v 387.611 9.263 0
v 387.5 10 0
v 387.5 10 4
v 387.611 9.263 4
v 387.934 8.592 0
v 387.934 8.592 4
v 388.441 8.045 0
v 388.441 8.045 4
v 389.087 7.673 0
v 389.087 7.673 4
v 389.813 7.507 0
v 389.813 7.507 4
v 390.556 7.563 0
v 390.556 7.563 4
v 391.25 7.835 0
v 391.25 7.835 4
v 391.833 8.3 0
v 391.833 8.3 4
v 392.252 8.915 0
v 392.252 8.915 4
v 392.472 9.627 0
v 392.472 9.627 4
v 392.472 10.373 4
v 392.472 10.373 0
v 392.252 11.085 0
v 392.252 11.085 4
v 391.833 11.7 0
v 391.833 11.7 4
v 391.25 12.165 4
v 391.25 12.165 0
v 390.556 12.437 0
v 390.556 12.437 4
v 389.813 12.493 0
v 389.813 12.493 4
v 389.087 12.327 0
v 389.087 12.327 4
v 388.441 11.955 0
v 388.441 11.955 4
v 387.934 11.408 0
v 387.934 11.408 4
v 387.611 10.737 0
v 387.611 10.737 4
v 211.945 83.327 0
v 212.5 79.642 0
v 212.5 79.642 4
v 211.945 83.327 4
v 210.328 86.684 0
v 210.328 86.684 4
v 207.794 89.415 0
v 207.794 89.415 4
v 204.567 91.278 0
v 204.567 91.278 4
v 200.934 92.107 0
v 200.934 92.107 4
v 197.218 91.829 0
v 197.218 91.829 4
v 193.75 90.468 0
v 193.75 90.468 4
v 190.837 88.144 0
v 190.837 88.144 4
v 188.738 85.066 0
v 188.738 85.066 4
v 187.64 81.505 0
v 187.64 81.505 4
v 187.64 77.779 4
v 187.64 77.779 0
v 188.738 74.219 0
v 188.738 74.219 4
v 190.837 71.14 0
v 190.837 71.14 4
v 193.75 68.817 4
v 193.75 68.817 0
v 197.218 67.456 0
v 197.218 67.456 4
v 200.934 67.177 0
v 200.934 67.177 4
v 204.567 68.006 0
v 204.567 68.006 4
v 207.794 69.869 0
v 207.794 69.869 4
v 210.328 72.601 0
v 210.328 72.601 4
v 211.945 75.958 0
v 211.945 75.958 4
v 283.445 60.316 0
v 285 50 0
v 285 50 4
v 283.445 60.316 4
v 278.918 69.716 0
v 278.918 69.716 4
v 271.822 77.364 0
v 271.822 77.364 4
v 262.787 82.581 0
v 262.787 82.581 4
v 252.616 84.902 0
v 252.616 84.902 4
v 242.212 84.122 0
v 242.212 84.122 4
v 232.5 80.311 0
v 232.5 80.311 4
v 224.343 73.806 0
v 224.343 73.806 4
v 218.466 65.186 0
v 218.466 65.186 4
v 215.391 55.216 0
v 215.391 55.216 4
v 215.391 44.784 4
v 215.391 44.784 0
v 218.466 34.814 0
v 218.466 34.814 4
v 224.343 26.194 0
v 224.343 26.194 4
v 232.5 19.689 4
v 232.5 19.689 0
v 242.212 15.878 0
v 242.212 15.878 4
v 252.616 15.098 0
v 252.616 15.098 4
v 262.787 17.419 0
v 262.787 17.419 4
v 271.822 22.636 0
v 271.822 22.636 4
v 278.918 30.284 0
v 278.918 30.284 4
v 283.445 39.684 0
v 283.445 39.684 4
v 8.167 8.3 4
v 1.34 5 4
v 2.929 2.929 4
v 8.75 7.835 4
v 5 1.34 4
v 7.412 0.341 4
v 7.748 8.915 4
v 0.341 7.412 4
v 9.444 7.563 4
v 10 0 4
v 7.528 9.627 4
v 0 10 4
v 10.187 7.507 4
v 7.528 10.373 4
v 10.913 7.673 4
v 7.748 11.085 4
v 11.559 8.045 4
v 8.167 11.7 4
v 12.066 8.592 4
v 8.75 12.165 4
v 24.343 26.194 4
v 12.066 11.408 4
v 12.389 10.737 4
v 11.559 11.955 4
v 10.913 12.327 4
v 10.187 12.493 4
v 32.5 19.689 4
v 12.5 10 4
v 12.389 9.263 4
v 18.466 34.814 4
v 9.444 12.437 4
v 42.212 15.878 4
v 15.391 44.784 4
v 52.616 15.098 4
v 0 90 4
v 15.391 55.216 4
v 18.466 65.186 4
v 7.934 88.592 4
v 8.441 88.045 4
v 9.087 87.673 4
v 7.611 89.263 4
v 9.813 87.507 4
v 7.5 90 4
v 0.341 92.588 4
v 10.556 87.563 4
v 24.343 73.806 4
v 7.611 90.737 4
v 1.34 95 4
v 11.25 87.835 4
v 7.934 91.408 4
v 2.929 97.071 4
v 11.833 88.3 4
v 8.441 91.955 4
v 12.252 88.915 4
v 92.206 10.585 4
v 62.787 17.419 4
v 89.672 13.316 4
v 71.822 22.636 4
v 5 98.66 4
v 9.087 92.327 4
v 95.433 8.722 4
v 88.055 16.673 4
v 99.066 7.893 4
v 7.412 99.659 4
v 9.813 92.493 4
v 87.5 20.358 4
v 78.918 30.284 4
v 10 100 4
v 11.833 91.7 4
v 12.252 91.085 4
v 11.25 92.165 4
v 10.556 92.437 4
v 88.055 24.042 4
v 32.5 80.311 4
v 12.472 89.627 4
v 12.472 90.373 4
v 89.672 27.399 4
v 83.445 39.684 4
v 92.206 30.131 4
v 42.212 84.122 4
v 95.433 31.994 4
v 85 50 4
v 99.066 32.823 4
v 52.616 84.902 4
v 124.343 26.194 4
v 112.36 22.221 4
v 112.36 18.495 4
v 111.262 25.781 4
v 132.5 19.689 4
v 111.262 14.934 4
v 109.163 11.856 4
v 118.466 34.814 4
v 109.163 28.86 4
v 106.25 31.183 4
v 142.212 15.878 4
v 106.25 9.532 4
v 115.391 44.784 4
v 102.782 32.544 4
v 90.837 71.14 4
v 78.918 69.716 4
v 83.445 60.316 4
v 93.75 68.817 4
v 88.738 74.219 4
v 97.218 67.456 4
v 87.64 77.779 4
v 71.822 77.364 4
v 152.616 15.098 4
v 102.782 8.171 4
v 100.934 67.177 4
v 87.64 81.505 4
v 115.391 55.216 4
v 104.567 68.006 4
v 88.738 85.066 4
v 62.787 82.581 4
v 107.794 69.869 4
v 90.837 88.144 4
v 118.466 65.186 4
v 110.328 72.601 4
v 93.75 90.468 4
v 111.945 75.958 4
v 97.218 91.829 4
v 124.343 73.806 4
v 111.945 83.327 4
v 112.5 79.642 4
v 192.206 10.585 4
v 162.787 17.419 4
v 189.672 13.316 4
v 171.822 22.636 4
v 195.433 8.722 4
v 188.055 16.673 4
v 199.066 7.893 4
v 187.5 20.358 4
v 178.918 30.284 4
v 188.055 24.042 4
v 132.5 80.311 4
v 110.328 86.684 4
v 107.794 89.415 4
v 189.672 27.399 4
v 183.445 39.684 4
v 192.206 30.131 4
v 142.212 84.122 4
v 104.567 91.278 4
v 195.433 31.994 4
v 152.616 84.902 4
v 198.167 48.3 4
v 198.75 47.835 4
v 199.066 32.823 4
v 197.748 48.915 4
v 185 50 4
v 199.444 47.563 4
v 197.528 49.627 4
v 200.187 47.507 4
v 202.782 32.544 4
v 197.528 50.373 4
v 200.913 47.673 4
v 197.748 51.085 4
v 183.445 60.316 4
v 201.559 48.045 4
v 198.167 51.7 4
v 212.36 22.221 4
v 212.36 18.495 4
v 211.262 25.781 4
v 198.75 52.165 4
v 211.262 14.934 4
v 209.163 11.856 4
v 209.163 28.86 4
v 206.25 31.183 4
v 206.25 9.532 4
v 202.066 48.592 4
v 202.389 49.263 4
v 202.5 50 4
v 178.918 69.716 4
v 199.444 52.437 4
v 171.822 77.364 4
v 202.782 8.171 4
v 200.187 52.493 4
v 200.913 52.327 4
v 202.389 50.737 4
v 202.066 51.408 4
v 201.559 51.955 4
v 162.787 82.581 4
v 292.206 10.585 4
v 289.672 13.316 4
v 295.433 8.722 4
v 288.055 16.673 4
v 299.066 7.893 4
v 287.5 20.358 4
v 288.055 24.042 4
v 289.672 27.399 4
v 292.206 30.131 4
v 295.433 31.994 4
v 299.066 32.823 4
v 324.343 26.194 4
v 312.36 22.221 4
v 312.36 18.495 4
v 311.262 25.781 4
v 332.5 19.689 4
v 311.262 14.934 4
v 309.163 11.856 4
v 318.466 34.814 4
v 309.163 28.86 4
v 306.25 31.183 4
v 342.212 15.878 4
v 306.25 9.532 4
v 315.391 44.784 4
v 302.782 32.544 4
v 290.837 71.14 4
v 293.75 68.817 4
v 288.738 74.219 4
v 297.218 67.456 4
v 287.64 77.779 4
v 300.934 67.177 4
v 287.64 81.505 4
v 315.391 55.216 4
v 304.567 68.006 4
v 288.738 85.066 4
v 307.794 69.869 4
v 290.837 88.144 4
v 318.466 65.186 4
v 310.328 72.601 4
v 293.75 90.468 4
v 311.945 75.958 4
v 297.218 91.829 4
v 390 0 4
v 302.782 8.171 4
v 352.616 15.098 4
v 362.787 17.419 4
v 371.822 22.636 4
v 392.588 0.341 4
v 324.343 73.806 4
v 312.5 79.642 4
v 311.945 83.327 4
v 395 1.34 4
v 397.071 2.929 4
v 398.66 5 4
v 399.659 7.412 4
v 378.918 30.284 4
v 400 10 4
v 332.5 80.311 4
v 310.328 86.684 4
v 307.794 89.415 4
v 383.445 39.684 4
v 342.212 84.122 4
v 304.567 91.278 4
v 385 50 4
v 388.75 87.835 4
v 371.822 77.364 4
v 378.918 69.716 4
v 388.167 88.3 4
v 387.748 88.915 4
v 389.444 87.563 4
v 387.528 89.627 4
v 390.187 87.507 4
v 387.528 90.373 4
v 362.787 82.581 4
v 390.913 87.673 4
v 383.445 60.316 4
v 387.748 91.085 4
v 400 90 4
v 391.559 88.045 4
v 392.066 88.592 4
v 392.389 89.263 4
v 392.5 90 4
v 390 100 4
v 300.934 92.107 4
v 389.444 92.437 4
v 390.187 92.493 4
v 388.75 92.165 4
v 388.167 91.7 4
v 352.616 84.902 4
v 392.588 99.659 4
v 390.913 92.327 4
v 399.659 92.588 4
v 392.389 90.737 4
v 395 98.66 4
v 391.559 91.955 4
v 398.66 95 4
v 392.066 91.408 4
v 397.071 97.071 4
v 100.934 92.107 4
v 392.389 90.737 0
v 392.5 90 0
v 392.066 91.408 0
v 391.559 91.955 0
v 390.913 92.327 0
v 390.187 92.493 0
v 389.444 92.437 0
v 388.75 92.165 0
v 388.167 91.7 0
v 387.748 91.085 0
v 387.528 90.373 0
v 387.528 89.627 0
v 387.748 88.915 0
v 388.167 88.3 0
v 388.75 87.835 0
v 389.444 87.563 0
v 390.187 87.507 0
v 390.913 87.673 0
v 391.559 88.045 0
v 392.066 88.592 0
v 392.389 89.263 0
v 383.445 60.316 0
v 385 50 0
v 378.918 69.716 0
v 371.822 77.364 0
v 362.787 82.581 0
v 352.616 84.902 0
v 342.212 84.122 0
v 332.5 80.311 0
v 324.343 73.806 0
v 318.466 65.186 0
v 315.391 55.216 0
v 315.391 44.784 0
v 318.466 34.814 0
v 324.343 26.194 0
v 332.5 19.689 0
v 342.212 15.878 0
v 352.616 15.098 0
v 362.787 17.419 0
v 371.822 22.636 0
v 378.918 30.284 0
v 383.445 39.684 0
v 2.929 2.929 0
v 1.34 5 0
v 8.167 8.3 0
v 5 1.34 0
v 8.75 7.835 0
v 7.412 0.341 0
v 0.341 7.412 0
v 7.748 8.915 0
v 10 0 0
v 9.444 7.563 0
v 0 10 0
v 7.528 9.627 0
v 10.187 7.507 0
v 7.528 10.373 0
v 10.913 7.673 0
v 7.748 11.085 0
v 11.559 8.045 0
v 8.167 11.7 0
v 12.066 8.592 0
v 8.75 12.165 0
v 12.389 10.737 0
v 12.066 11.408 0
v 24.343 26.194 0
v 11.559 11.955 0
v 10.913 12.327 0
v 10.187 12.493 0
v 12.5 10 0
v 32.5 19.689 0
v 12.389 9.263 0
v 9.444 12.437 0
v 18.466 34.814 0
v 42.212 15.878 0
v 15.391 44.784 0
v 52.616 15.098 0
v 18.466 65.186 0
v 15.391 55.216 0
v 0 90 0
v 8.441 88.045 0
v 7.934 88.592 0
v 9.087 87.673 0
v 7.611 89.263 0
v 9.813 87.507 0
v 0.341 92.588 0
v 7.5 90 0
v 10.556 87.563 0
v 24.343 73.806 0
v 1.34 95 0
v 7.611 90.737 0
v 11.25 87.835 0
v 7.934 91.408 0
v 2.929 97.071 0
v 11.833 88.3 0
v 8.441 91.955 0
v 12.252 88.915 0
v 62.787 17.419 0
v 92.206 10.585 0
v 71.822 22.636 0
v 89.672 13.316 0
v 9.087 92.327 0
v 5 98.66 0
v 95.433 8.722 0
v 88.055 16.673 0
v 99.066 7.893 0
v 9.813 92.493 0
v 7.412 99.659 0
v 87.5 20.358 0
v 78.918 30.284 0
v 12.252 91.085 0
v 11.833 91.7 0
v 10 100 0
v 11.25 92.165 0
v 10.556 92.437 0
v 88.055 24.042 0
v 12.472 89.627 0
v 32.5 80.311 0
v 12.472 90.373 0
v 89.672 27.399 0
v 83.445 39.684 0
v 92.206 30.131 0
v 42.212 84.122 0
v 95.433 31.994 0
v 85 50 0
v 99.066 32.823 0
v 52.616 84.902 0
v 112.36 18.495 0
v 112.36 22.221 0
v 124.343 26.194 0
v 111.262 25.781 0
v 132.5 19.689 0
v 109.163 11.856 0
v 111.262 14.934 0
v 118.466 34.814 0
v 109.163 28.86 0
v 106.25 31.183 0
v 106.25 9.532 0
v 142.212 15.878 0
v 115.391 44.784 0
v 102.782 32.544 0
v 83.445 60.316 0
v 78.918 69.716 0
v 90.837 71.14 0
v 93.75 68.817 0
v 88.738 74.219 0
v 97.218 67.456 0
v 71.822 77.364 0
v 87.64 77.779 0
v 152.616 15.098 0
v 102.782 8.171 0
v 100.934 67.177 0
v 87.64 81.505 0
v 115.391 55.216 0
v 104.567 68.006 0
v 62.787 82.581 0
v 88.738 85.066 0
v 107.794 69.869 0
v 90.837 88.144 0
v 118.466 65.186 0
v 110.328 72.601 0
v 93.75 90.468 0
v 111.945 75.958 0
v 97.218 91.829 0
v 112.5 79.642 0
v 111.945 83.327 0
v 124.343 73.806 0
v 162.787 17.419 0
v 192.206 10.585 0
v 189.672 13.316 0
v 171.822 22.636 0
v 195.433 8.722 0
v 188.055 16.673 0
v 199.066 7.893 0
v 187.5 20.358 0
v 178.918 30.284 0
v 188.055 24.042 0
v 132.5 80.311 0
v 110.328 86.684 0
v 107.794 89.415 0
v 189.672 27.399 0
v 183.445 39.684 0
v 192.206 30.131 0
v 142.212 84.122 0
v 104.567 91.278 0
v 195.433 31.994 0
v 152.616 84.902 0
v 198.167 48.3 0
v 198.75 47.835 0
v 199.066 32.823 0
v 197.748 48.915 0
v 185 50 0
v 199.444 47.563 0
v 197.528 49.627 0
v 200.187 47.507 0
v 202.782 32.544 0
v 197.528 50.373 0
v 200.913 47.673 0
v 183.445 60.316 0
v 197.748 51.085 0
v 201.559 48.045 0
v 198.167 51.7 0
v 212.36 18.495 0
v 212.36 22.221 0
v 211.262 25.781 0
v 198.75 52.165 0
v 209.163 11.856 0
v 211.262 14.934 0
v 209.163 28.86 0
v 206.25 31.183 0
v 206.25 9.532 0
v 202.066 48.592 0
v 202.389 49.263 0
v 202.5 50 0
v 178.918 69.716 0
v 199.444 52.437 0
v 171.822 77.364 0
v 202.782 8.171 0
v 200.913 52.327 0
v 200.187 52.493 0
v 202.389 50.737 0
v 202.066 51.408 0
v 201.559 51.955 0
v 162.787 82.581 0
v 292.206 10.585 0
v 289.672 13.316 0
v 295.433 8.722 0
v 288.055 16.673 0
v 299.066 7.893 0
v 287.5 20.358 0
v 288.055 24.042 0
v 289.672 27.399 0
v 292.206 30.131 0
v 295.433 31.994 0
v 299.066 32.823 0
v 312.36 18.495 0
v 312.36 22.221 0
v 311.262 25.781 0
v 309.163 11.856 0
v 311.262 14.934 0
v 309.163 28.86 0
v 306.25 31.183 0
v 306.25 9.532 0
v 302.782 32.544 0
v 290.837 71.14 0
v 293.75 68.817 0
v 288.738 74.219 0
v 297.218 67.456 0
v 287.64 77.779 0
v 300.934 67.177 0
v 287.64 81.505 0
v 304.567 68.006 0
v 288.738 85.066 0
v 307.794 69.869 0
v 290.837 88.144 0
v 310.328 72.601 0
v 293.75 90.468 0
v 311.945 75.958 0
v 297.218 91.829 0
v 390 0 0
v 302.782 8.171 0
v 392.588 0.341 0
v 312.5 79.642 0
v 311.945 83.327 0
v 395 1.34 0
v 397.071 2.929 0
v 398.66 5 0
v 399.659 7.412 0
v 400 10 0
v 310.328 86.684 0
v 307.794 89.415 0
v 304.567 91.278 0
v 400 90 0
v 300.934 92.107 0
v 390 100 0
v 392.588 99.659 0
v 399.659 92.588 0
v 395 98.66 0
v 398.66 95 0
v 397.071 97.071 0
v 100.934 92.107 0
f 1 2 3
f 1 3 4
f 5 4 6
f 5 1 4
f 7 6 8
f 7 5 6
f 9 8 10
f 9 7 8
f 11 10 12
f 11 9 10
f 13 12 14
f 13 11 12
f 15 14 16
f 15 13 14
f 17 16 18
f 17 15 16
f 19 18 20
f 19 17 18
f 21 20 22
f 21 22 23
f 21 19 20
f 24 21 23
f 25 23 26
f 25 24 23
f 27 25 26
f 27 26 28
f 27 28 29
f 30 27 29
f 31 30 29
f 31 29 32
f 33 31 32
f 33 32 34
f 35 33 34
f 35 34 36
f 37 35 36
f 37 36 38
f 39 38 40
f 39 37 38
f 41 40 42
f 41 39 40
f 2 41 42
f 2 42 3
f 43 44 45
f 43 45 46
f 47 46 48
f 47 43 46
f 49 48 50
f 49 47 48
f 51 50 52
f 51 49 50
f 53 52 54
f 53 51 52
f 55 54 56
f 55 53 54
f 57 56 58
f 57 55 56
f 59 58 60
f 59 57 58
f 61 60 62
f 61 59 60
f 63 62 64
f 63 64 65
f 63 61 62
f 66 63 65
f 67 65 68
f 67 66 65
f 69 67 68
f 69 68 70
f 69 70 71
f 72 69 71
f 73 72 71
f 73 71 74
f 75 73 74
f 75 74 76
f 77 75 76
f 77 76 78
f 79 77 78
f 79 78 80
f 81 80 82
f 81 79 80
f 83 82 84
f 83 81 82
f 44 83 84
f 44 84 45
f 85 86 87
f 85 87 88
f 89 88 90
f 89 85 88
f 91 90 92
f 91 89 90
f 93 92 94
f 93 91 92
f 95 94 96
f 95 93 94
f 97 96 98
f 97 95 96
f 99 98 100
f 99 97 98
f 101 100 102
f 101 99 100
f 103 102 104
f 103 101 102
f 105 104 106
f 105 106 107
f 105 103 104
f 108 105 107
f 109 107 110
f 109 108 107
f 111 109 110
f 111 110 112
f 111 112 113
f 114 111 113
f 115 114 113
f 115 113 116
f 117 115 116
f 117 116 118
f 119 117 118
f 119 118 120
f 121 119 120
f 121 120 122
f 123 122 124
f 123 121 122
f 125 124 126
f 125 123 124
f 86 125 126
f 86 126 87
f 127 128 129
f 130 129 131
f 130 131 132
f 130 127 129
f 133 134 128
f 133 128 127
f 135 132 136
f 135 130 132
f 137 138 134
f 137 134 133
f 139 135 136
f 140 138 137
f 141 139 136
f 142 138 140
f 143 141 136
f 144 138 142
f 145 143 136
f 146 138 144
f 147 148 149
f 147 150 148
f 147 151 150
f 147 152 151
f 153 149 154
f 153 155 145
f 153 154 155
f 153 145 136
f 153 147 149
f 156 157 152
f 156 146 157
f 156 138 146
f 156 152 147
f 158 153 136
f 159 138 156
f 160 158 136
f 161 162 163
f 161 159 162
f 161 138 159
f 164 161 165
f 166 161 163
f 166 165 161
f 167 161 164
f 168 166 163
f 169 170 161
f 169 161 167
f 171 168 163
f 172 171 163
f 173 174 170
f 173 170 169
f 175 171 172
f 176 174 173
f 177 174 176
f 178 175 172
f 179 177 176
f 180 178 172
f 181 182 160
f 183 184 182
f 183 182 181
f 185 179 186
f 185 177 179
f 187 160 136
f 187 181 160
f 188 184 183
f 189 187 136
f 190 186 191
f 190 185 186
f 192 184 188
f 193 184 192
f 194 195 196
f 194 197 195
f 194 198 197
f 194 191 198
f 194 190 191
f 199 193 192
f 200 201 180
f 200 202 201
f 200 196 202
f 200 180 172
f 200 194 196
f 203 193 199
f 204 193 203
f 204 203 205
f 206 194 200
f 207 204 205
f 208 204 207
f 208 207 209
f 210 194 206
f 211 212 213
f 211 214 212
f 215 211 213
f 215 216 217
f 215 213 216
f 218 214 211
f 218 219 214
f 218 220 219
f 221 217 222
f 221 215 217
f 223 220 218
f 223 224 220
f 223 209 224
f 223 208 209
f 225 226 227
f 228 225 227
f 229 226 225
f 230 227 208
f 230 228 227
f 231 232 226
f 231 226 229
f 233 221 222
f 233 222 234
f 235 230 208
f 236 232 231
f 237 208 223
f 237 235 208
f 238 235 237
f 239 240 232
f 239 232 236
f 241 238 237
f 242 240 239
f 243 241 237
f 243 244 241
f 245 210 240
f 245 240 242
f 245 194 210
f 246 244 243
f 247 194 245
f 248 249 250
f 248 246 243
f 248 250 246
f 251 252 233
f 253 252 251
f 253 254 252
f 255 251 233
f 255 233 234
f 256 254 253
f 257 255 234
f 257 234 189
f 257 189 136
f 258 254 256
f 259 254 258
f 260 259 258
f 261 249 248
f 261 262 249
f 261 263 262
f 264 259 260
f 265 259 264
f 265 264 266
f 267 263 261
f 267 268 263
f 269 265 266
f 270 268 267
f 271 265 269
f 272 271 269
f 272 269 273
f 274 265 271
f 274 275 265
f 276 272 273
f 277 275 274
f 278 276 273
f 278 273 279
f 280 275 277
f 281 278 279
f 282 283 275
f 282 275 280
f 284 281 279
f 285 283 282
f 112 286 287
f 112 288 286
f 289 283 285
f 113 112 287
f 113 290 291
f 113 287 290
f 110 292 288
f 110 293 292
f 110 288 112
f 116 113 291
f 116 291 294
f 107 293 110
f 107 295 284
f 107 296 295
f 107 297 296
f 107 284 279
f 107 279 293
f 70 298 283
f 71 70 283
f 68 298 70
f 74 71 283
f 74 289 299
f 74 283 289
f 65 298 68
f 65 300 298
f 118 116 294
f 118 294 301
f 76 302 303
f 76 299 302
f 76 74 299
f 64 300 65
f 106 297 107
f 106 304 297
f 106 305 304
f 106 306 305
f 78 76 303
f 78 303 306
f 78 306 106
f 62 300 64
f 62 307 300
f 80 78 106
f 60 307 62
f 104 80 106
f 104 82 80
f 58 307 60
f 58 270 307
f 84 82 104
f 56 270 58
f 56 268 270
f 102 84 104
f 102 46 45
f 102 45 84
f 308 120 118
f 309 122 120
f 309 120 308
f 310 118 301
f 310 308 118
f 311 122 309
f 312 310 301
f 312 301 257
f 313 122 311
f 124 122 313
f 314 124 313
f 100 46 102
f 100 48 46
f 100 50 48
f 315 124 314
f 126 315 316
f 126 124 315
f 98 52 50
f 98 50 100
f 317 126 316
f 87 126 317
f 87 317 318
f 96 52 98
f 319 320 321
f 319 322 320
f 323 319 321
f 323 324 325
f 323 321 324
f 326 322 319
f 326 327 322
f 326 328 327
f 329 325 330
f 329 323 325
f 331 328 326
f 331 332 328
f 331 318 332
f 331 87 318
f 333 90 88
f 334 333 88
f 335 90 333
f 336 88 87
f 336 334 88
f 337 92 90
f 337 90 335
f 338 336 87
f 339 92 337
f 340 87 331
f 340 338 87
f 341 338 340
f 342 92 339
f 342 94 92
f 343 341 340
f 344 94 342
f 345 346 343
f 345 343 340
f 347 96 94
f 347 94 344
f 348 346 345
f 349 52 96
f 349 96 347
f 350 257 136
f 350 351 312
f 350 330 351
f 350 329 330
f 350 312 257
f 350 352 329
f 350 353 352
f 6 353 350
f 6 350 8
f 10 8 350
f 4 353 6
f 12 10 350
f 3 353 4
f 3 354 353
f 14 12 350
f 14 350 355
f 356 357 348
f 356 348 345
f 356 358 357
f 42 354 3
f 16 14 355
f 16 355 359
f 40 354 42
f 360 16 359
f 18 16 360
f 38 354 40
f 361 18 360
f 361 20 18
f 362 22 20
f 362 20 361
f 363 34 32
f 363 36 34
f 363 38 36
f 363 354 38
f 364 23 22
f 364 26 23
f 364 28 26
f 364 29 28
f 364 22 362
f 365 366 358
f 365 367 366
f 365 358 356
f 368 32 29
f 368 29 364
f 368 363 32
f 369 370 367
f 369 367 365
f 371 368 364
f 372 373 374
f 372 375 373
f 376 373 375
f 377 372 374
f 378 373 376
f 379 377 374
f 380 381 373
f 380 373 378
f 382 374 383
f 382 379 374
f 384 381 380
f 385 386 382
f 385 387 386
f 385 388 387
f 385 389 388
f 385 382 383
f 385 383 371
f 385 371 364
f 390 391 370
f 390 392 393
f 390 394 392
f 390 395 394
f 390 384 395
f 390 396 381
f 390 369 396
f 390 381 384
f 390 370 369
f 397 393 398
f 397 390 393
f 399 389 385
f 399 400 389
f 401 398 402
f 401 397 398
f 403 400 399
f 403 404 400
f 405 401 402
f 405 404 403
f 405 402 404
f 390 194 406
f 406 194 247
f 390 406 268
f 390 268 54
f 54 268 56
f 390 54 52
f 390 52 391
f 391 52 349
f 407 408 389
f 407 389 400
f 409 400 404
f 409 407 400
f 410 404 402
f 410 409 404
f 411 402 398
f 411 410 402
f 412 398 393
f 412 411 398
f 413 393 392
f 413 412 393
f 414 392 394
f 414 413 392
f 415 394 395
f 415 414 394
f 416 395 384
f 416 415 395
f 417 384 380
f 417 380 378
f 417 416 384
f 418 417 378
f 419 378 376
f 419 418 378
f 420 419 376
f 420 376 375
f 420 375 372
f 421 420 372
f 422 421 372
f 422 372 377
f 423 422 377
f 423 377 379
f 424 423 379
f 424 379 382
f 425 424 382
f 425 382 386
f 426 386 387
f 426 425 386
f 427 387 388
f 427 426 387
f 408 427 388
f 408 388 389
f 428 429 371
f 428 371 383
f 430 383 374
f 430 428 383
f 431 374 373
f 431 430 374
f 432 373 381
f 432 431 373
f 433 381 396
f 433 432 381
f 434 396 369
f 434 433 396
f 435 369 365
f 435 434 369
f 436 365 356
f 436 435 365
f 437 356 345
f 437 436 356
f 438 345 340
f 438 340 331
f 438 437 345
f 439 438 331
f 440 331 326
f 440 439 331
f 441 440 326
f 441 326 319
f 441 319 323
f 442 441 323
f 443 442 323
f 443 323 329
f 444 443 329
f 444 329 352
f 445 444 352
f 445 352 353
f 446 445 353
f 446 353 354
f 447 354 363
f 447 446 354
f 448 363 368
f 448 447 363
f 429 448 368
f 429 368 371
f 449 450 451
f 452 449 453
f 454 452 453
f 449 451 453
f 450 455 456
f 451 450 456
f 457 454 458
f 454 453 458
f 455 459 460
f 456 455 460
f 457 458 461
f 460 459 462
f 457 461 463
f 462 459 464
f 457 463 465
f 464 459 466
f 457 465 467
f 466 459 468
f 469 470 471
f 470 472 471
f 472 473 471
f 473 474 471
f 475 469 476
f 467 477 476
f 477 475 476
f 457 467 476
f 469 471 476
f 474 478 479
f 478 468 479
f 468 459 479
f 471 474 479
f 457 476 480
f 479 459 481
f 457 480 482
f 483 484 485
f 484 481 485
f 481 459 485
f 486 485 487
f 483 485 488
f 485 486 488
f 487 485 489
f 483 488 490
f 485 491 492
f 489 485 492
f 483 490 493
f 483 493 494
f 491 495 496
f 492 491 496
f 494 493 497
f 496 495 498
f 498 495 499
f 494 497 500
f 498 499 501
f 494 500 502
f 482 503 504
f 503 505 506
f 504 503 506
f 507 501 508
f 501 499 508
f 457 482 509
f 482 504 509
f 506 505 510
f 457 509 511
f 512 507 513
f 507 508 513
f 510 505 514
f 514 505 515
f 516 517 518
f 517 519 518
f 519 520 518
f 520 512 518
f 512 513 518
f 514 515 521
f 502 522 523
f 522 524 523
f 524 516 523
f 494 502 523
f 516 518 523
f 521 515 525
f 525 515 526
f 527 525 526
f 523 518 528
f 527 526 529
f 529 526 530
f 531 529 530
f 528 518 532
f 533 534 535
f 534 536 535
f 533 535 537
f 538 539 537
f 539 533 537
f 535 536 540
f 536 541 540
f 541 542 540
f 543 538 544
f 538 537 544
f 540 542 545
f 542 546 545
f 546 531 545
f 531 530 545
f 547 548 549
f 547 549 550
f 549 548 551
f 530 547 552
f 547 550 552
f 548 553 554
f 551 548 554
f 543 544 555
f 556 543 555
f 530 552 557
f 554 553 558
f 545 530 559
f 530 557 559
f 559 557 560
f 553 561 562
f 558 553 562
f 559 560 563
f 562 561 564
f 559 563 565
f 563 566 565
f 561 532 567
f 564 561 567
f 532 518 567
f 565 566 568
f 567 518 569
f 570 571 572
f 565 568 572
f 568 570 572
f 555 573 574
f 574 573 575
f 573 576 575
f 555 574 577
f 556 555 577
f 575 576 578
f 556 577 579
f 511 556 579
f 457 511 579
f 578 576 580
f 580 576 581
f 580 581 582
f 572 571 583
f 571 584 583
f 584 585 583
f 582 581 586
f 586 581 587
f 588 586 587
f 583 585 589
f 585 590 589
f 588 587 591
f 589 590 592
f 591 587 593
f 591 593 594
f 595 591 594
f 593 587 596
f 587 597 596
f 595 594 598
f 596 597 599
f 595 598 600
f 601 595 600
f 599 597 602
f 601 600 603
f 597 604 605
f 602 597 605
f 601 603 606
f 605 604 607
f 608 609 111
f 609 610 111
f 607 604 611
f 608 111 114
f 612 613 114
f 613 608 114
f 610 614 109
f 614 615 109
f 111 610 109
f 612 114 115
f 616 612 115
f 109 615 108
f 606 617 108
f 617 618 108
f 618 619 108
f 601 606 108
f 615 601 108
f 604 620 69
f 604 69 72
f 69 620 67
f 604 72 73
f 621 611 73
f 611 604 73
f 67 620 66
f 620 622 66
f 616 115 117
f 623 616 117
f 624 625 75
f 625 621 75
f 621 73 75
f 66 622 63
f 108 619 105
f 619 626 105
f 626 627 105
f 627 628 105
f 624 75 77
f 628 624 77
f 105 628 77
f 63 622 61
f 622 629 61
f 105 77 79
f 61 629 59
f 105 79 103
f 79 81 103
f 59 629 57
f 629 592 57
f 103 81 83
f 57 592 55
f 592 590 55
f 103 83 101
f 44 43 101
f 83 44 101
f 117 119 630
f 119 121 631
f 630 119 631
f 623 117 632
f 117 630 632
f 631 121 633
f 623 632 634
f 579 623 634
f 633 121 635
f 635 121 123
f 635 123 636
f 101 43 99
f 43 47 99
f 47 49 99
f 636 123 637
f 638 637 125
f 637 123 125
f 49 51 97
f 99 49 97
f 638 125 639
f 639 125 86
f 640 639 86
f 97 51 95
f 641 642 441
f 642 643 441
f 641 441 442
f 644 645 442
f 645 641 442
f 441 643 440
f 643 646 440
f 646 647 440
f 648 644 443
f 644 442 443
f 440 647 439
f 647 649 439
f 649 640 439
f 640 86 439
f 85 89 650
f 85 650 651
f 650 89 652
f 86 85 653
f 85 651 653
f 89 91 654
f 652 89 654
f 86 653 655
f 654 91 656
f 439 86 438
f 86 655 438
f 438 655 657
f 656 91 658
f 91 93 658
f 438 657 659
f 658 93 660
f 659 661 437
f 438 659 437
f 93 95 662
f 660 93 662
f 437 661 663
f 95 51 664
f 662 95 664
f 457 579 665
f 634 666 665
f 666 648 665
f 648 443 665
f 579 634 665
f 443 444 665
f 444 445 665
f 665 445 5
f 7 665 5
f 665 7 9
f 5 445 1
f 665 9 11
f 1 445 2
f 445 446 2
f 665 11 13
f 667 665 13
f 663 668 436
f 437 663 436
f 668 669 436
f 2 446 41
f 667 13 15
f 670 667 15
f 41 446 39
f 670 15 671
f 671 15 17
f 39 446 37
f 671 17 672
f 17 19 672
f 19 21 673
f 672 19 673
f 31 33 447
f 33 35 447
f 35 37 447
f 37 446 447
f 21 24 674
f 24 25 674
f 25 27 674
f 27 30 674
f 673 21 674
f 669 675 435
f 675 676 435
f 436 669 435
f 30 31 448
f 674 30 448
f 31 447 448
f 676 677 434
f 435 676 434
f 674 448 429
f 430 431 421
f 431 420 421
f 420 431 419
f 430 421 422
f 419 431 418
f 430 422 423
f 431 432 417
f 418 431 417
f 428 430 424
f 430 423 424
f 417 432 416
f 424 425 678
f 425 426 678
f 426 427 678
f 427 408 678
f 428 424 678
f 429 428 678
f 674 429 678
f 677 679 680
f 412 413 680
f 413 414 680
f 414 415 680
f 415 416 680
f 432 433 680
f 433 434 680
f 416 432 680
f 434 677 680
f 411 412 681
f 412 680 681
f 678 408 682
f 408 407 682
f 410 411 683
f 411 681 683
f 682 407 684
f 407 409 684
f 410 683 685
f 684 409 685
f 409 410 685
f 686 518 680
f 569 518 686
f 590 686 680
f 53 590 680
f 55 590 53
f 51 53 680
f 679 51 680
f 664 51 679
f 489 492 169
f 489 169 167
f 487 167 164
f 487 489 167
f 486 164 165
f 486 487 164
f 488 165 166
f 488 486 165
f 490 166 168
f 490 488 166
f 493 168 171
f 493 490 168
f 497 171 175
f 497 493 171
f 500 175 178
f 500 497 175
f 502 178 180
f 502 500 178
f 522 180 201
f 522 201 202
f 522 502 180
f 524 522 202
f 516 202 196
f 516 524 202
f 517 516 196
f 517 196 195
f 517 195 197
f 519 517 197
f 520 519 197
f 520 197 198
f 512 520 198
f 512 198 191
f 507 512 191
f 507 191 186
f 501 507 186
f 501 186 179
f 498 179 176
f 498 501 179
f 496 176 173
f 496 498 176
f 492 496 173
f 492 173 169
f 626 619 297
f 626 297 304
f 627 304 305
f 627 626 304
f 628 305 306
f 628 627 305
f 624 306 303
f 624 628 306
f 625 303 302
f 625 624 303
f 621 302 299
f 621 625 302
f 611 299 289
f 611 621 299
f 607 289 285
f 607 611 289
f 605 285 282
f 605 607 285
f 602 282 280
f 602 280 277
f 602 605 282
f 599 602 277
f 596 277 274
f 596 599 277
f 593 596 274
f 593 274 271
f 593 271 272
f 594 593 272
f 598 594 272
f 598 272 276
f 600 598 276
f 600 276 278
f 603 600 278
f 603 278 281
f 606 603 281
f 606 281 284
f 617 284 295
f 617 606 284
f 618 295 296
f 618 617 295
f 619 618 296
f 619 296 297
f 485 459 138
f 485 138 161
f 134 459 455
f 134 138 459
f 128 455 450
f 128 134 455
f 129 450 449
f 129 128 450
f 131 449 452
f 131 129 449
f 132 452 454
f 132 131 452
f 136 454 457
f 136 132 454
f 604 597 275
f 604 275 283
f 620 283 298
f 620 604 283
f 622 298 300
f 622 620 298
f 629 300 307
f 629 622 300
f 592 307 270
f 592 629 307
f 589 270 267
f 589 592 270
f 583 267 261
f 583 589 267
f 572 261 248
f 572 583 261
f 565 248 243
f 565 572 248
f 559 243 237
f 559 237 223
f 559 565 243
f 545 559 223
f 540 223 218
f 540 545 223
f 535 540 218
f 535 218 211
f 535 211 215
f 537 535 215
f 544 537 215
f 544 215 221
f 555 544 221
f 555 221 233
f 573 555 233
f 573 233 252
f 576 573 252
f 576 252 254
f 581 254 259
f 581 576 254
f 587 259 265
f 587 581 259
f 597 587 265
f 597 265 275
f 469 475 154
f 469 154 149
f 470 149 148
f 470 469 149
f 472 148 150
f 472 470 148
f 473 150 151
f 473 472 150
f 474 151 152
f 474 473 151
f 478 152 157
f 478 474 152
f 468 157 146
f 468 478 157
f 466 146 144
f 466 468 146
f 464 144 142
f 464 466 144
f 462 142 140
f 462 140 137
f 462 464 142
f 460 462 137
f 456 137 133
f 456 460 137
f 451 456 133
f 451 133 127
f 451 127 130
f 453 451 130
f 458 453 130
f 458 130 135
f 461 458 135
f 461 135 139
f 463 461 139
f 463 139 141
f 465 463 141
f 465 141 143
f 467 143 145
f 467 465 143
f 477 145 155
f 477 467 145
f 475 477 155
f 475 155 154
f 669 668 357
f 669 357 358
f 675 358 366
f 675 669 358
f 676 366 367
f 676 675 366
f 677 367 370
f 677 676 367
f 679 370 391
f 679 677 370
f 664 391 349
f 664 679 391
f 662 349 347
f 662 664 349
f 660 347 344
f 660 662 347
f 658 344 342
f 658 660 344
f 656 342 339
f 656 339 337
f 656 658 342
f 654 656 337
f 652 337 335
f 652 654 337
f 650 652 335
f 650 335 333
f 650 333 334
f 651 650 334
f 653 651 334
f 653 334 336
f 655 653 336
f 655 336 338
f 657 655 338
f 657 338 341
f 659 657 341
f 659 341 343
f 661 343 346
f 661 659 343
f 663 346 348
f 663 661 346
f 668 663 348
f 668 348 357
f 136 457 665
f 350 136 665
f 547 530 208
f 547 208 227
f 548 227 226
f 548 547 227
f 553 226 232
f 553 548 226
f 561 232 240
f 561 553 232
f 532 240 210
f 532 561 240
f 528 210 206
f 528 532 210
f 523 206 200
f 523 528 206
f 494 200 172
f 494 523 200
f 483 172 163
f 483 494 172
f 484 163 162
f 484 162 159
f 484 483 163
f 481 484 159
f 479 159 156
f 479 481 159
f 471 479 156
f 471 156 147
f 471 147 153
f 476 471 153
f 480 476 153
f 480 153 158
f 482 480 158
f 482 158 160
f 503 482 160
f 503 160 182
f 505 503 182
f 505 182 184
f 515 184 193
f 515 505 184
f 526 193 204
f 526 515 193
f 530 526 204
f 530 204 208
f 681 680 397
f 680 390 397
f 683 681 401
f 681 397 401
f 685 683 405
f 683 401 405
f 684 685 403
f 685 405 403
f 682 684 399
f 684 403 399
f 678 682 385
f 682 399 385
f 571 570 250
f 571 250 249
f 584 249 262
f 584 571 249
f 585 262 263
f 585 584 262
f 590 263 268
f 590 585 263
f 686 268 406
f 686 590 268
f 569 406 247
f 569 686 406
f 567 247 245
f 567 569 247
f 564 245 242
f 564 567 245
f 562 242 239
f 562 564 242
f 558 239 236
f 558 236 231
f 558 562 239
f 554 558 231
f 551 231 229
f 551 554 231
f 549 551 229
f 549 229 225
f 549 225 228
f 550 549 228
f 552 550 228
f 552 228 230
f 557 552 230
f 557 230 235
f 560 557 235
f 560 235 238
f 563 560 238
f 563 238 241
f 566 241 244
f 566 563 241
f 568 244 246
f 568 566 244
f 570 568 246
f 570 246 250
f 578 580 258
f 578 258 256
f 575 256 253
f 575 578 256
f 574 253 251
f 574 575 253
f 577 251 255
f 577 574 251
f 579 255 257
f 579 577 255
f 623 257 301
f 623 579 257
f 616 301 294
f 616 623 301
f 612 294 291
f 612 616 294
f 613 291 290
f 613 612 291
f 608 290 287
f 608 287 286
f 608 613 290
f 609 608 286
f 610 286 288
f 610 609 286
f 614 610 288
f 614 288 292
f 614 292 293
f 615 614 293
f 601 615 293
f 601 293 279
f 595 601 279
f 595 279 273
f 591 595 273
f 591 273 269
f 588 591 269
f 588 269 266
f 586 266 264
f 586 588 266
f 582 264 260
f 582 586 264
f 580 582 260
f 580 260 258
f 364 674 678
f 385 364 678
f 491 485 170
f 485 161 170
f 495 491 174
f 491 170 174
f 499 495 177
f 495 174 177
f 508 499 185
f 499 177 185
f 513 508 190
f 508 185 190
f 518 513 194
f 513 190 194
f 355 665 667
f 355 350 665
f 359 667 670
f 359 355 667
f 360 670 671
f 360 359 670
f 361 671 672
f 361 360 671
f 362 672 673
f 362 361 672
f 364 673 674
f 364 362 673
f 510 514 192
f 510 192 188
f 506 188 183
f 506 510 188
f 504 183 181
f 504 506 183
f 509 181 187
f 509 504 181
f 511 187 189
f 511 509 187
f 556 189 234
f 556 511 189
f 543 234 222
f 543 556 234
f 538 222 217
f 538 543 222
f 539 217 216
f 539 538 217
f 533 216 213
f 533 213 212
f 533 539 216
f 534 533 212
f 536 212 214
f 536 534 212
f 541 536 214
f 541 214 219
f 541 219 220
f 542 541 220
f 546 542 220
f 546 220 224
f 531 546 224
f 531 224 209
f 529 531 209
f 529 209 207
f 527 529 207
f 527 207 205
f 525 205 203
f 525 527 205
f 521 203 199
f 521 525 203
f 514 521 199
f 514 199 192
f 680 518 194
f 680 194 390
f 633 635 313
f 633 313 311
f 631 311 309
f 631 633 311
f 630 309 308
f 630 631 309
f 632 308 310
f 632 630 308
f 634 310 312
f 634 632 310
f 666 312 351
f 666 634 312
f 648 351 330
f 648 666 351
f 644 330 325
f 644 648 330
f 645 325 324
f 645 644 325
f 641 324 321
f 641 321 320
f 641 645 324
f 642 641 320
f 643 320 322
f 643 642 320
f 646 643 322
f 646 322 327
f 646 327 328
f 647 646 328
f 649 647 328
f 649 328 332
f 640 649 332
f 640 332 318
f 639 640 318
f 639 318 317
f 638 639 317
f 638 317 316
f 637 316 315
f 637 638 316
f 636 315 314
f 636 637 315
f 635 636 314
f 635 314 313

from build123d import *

# Parameters (mm, degrees)
SKETCH1_W           = 400
SKETCH1_H           = 100
SKETCH1_R           = 35
SKETCH1_R_2         = 12.5
SKETCH1_R_3         = 2.5
BOSS_EXTRUDE1_DEPTH = 4
FILLET1_R           = 10


with BuildPart() as part:
    # Sketch1 → Boss-Extrude1 (new body)
    with BuildSketch(Plane.XY):
        with Locations((200, 50)):
            Rectangle(SKETCH1_W, SKETCH1_H)
        with Locations((50, 50)):
            Circle(SKETCH1_R, mode=Mode.SUBTRACT)
        with Locations((150, 50)):
            Circle(SKETCH1_R, mode=Mode.SUBTRACT)
        with Locations((250, 50)):
            Circle(SKETCH1_R, mode=Mode.SUBTRACT)
        with Locations((350, 50)):
            Circle(SKETCH1_R, mode=Mode.SUBTRACT)
        with Locations((100, 79.642297689)):
            Circle(SKETCH1_R_2, mode=Mode.SUBTRACT)
        with Locations(Location((100, 20.357702311, 0), (0, 0, 180))):
            Circle(SKETCH1_R_2, mode=Mode.SUBTRACT)
        with Locations(Location((200, 20.357702311, 0), (0, 0, 180))):
            Circle(SKETCH1_R_2, mode=Mode.SUBTRACT)
        with Locations((200, 79.642297689)):
            Circle(SKETCH1_R_2, mode=Mode.SUBTRACT)
        with Locations(Location((300, 20.357702311, 0), (0, 0, 180))):
            Circle(SKETCH1_R_2, mode=Mode.SUBTRACT)
        with Locations((300, 79.642297689)):
            Circle(SKETCH1_R_2, mode=Mode.SUBTRACT)
        with Locations((10, 10)):
            Circle(SKETCH1_R_3, mode=Mode.SUBTRACT)
        with Locations(Location((10, 90, 0), (0, 0, 180))):
            Circle(SKETCH1_R_3, mode=Mode.SUBTRACT)
        with Locations((390, 90)):
            Circle(SKETCH1_R_3, mode=Mode.SUBTRACT)
        with Locations(Location((390, 10, 0), (0, 0, 180))):
            Circle(SKETCH1_R_3, mode=Mode.SUBTRACT)
        with Locations((200, 50)):
            Circle(SKETCH1_R_3, mode=Mode.SUBTRACT)
    extrude(amount=BOSS_EXTRUDE1_DEPTH)

    # Fillet1
    fillet1_edges = [part.edges().sort_by_distance(p)[0] for p in [
        (0, 100, 2),
        (400, 100, 2),
        (400, 0, 2),
        (0, 0, 2),
    ]]
    fillet(fillet1_edges, radius=FILLET1_R)


solid = part.part
